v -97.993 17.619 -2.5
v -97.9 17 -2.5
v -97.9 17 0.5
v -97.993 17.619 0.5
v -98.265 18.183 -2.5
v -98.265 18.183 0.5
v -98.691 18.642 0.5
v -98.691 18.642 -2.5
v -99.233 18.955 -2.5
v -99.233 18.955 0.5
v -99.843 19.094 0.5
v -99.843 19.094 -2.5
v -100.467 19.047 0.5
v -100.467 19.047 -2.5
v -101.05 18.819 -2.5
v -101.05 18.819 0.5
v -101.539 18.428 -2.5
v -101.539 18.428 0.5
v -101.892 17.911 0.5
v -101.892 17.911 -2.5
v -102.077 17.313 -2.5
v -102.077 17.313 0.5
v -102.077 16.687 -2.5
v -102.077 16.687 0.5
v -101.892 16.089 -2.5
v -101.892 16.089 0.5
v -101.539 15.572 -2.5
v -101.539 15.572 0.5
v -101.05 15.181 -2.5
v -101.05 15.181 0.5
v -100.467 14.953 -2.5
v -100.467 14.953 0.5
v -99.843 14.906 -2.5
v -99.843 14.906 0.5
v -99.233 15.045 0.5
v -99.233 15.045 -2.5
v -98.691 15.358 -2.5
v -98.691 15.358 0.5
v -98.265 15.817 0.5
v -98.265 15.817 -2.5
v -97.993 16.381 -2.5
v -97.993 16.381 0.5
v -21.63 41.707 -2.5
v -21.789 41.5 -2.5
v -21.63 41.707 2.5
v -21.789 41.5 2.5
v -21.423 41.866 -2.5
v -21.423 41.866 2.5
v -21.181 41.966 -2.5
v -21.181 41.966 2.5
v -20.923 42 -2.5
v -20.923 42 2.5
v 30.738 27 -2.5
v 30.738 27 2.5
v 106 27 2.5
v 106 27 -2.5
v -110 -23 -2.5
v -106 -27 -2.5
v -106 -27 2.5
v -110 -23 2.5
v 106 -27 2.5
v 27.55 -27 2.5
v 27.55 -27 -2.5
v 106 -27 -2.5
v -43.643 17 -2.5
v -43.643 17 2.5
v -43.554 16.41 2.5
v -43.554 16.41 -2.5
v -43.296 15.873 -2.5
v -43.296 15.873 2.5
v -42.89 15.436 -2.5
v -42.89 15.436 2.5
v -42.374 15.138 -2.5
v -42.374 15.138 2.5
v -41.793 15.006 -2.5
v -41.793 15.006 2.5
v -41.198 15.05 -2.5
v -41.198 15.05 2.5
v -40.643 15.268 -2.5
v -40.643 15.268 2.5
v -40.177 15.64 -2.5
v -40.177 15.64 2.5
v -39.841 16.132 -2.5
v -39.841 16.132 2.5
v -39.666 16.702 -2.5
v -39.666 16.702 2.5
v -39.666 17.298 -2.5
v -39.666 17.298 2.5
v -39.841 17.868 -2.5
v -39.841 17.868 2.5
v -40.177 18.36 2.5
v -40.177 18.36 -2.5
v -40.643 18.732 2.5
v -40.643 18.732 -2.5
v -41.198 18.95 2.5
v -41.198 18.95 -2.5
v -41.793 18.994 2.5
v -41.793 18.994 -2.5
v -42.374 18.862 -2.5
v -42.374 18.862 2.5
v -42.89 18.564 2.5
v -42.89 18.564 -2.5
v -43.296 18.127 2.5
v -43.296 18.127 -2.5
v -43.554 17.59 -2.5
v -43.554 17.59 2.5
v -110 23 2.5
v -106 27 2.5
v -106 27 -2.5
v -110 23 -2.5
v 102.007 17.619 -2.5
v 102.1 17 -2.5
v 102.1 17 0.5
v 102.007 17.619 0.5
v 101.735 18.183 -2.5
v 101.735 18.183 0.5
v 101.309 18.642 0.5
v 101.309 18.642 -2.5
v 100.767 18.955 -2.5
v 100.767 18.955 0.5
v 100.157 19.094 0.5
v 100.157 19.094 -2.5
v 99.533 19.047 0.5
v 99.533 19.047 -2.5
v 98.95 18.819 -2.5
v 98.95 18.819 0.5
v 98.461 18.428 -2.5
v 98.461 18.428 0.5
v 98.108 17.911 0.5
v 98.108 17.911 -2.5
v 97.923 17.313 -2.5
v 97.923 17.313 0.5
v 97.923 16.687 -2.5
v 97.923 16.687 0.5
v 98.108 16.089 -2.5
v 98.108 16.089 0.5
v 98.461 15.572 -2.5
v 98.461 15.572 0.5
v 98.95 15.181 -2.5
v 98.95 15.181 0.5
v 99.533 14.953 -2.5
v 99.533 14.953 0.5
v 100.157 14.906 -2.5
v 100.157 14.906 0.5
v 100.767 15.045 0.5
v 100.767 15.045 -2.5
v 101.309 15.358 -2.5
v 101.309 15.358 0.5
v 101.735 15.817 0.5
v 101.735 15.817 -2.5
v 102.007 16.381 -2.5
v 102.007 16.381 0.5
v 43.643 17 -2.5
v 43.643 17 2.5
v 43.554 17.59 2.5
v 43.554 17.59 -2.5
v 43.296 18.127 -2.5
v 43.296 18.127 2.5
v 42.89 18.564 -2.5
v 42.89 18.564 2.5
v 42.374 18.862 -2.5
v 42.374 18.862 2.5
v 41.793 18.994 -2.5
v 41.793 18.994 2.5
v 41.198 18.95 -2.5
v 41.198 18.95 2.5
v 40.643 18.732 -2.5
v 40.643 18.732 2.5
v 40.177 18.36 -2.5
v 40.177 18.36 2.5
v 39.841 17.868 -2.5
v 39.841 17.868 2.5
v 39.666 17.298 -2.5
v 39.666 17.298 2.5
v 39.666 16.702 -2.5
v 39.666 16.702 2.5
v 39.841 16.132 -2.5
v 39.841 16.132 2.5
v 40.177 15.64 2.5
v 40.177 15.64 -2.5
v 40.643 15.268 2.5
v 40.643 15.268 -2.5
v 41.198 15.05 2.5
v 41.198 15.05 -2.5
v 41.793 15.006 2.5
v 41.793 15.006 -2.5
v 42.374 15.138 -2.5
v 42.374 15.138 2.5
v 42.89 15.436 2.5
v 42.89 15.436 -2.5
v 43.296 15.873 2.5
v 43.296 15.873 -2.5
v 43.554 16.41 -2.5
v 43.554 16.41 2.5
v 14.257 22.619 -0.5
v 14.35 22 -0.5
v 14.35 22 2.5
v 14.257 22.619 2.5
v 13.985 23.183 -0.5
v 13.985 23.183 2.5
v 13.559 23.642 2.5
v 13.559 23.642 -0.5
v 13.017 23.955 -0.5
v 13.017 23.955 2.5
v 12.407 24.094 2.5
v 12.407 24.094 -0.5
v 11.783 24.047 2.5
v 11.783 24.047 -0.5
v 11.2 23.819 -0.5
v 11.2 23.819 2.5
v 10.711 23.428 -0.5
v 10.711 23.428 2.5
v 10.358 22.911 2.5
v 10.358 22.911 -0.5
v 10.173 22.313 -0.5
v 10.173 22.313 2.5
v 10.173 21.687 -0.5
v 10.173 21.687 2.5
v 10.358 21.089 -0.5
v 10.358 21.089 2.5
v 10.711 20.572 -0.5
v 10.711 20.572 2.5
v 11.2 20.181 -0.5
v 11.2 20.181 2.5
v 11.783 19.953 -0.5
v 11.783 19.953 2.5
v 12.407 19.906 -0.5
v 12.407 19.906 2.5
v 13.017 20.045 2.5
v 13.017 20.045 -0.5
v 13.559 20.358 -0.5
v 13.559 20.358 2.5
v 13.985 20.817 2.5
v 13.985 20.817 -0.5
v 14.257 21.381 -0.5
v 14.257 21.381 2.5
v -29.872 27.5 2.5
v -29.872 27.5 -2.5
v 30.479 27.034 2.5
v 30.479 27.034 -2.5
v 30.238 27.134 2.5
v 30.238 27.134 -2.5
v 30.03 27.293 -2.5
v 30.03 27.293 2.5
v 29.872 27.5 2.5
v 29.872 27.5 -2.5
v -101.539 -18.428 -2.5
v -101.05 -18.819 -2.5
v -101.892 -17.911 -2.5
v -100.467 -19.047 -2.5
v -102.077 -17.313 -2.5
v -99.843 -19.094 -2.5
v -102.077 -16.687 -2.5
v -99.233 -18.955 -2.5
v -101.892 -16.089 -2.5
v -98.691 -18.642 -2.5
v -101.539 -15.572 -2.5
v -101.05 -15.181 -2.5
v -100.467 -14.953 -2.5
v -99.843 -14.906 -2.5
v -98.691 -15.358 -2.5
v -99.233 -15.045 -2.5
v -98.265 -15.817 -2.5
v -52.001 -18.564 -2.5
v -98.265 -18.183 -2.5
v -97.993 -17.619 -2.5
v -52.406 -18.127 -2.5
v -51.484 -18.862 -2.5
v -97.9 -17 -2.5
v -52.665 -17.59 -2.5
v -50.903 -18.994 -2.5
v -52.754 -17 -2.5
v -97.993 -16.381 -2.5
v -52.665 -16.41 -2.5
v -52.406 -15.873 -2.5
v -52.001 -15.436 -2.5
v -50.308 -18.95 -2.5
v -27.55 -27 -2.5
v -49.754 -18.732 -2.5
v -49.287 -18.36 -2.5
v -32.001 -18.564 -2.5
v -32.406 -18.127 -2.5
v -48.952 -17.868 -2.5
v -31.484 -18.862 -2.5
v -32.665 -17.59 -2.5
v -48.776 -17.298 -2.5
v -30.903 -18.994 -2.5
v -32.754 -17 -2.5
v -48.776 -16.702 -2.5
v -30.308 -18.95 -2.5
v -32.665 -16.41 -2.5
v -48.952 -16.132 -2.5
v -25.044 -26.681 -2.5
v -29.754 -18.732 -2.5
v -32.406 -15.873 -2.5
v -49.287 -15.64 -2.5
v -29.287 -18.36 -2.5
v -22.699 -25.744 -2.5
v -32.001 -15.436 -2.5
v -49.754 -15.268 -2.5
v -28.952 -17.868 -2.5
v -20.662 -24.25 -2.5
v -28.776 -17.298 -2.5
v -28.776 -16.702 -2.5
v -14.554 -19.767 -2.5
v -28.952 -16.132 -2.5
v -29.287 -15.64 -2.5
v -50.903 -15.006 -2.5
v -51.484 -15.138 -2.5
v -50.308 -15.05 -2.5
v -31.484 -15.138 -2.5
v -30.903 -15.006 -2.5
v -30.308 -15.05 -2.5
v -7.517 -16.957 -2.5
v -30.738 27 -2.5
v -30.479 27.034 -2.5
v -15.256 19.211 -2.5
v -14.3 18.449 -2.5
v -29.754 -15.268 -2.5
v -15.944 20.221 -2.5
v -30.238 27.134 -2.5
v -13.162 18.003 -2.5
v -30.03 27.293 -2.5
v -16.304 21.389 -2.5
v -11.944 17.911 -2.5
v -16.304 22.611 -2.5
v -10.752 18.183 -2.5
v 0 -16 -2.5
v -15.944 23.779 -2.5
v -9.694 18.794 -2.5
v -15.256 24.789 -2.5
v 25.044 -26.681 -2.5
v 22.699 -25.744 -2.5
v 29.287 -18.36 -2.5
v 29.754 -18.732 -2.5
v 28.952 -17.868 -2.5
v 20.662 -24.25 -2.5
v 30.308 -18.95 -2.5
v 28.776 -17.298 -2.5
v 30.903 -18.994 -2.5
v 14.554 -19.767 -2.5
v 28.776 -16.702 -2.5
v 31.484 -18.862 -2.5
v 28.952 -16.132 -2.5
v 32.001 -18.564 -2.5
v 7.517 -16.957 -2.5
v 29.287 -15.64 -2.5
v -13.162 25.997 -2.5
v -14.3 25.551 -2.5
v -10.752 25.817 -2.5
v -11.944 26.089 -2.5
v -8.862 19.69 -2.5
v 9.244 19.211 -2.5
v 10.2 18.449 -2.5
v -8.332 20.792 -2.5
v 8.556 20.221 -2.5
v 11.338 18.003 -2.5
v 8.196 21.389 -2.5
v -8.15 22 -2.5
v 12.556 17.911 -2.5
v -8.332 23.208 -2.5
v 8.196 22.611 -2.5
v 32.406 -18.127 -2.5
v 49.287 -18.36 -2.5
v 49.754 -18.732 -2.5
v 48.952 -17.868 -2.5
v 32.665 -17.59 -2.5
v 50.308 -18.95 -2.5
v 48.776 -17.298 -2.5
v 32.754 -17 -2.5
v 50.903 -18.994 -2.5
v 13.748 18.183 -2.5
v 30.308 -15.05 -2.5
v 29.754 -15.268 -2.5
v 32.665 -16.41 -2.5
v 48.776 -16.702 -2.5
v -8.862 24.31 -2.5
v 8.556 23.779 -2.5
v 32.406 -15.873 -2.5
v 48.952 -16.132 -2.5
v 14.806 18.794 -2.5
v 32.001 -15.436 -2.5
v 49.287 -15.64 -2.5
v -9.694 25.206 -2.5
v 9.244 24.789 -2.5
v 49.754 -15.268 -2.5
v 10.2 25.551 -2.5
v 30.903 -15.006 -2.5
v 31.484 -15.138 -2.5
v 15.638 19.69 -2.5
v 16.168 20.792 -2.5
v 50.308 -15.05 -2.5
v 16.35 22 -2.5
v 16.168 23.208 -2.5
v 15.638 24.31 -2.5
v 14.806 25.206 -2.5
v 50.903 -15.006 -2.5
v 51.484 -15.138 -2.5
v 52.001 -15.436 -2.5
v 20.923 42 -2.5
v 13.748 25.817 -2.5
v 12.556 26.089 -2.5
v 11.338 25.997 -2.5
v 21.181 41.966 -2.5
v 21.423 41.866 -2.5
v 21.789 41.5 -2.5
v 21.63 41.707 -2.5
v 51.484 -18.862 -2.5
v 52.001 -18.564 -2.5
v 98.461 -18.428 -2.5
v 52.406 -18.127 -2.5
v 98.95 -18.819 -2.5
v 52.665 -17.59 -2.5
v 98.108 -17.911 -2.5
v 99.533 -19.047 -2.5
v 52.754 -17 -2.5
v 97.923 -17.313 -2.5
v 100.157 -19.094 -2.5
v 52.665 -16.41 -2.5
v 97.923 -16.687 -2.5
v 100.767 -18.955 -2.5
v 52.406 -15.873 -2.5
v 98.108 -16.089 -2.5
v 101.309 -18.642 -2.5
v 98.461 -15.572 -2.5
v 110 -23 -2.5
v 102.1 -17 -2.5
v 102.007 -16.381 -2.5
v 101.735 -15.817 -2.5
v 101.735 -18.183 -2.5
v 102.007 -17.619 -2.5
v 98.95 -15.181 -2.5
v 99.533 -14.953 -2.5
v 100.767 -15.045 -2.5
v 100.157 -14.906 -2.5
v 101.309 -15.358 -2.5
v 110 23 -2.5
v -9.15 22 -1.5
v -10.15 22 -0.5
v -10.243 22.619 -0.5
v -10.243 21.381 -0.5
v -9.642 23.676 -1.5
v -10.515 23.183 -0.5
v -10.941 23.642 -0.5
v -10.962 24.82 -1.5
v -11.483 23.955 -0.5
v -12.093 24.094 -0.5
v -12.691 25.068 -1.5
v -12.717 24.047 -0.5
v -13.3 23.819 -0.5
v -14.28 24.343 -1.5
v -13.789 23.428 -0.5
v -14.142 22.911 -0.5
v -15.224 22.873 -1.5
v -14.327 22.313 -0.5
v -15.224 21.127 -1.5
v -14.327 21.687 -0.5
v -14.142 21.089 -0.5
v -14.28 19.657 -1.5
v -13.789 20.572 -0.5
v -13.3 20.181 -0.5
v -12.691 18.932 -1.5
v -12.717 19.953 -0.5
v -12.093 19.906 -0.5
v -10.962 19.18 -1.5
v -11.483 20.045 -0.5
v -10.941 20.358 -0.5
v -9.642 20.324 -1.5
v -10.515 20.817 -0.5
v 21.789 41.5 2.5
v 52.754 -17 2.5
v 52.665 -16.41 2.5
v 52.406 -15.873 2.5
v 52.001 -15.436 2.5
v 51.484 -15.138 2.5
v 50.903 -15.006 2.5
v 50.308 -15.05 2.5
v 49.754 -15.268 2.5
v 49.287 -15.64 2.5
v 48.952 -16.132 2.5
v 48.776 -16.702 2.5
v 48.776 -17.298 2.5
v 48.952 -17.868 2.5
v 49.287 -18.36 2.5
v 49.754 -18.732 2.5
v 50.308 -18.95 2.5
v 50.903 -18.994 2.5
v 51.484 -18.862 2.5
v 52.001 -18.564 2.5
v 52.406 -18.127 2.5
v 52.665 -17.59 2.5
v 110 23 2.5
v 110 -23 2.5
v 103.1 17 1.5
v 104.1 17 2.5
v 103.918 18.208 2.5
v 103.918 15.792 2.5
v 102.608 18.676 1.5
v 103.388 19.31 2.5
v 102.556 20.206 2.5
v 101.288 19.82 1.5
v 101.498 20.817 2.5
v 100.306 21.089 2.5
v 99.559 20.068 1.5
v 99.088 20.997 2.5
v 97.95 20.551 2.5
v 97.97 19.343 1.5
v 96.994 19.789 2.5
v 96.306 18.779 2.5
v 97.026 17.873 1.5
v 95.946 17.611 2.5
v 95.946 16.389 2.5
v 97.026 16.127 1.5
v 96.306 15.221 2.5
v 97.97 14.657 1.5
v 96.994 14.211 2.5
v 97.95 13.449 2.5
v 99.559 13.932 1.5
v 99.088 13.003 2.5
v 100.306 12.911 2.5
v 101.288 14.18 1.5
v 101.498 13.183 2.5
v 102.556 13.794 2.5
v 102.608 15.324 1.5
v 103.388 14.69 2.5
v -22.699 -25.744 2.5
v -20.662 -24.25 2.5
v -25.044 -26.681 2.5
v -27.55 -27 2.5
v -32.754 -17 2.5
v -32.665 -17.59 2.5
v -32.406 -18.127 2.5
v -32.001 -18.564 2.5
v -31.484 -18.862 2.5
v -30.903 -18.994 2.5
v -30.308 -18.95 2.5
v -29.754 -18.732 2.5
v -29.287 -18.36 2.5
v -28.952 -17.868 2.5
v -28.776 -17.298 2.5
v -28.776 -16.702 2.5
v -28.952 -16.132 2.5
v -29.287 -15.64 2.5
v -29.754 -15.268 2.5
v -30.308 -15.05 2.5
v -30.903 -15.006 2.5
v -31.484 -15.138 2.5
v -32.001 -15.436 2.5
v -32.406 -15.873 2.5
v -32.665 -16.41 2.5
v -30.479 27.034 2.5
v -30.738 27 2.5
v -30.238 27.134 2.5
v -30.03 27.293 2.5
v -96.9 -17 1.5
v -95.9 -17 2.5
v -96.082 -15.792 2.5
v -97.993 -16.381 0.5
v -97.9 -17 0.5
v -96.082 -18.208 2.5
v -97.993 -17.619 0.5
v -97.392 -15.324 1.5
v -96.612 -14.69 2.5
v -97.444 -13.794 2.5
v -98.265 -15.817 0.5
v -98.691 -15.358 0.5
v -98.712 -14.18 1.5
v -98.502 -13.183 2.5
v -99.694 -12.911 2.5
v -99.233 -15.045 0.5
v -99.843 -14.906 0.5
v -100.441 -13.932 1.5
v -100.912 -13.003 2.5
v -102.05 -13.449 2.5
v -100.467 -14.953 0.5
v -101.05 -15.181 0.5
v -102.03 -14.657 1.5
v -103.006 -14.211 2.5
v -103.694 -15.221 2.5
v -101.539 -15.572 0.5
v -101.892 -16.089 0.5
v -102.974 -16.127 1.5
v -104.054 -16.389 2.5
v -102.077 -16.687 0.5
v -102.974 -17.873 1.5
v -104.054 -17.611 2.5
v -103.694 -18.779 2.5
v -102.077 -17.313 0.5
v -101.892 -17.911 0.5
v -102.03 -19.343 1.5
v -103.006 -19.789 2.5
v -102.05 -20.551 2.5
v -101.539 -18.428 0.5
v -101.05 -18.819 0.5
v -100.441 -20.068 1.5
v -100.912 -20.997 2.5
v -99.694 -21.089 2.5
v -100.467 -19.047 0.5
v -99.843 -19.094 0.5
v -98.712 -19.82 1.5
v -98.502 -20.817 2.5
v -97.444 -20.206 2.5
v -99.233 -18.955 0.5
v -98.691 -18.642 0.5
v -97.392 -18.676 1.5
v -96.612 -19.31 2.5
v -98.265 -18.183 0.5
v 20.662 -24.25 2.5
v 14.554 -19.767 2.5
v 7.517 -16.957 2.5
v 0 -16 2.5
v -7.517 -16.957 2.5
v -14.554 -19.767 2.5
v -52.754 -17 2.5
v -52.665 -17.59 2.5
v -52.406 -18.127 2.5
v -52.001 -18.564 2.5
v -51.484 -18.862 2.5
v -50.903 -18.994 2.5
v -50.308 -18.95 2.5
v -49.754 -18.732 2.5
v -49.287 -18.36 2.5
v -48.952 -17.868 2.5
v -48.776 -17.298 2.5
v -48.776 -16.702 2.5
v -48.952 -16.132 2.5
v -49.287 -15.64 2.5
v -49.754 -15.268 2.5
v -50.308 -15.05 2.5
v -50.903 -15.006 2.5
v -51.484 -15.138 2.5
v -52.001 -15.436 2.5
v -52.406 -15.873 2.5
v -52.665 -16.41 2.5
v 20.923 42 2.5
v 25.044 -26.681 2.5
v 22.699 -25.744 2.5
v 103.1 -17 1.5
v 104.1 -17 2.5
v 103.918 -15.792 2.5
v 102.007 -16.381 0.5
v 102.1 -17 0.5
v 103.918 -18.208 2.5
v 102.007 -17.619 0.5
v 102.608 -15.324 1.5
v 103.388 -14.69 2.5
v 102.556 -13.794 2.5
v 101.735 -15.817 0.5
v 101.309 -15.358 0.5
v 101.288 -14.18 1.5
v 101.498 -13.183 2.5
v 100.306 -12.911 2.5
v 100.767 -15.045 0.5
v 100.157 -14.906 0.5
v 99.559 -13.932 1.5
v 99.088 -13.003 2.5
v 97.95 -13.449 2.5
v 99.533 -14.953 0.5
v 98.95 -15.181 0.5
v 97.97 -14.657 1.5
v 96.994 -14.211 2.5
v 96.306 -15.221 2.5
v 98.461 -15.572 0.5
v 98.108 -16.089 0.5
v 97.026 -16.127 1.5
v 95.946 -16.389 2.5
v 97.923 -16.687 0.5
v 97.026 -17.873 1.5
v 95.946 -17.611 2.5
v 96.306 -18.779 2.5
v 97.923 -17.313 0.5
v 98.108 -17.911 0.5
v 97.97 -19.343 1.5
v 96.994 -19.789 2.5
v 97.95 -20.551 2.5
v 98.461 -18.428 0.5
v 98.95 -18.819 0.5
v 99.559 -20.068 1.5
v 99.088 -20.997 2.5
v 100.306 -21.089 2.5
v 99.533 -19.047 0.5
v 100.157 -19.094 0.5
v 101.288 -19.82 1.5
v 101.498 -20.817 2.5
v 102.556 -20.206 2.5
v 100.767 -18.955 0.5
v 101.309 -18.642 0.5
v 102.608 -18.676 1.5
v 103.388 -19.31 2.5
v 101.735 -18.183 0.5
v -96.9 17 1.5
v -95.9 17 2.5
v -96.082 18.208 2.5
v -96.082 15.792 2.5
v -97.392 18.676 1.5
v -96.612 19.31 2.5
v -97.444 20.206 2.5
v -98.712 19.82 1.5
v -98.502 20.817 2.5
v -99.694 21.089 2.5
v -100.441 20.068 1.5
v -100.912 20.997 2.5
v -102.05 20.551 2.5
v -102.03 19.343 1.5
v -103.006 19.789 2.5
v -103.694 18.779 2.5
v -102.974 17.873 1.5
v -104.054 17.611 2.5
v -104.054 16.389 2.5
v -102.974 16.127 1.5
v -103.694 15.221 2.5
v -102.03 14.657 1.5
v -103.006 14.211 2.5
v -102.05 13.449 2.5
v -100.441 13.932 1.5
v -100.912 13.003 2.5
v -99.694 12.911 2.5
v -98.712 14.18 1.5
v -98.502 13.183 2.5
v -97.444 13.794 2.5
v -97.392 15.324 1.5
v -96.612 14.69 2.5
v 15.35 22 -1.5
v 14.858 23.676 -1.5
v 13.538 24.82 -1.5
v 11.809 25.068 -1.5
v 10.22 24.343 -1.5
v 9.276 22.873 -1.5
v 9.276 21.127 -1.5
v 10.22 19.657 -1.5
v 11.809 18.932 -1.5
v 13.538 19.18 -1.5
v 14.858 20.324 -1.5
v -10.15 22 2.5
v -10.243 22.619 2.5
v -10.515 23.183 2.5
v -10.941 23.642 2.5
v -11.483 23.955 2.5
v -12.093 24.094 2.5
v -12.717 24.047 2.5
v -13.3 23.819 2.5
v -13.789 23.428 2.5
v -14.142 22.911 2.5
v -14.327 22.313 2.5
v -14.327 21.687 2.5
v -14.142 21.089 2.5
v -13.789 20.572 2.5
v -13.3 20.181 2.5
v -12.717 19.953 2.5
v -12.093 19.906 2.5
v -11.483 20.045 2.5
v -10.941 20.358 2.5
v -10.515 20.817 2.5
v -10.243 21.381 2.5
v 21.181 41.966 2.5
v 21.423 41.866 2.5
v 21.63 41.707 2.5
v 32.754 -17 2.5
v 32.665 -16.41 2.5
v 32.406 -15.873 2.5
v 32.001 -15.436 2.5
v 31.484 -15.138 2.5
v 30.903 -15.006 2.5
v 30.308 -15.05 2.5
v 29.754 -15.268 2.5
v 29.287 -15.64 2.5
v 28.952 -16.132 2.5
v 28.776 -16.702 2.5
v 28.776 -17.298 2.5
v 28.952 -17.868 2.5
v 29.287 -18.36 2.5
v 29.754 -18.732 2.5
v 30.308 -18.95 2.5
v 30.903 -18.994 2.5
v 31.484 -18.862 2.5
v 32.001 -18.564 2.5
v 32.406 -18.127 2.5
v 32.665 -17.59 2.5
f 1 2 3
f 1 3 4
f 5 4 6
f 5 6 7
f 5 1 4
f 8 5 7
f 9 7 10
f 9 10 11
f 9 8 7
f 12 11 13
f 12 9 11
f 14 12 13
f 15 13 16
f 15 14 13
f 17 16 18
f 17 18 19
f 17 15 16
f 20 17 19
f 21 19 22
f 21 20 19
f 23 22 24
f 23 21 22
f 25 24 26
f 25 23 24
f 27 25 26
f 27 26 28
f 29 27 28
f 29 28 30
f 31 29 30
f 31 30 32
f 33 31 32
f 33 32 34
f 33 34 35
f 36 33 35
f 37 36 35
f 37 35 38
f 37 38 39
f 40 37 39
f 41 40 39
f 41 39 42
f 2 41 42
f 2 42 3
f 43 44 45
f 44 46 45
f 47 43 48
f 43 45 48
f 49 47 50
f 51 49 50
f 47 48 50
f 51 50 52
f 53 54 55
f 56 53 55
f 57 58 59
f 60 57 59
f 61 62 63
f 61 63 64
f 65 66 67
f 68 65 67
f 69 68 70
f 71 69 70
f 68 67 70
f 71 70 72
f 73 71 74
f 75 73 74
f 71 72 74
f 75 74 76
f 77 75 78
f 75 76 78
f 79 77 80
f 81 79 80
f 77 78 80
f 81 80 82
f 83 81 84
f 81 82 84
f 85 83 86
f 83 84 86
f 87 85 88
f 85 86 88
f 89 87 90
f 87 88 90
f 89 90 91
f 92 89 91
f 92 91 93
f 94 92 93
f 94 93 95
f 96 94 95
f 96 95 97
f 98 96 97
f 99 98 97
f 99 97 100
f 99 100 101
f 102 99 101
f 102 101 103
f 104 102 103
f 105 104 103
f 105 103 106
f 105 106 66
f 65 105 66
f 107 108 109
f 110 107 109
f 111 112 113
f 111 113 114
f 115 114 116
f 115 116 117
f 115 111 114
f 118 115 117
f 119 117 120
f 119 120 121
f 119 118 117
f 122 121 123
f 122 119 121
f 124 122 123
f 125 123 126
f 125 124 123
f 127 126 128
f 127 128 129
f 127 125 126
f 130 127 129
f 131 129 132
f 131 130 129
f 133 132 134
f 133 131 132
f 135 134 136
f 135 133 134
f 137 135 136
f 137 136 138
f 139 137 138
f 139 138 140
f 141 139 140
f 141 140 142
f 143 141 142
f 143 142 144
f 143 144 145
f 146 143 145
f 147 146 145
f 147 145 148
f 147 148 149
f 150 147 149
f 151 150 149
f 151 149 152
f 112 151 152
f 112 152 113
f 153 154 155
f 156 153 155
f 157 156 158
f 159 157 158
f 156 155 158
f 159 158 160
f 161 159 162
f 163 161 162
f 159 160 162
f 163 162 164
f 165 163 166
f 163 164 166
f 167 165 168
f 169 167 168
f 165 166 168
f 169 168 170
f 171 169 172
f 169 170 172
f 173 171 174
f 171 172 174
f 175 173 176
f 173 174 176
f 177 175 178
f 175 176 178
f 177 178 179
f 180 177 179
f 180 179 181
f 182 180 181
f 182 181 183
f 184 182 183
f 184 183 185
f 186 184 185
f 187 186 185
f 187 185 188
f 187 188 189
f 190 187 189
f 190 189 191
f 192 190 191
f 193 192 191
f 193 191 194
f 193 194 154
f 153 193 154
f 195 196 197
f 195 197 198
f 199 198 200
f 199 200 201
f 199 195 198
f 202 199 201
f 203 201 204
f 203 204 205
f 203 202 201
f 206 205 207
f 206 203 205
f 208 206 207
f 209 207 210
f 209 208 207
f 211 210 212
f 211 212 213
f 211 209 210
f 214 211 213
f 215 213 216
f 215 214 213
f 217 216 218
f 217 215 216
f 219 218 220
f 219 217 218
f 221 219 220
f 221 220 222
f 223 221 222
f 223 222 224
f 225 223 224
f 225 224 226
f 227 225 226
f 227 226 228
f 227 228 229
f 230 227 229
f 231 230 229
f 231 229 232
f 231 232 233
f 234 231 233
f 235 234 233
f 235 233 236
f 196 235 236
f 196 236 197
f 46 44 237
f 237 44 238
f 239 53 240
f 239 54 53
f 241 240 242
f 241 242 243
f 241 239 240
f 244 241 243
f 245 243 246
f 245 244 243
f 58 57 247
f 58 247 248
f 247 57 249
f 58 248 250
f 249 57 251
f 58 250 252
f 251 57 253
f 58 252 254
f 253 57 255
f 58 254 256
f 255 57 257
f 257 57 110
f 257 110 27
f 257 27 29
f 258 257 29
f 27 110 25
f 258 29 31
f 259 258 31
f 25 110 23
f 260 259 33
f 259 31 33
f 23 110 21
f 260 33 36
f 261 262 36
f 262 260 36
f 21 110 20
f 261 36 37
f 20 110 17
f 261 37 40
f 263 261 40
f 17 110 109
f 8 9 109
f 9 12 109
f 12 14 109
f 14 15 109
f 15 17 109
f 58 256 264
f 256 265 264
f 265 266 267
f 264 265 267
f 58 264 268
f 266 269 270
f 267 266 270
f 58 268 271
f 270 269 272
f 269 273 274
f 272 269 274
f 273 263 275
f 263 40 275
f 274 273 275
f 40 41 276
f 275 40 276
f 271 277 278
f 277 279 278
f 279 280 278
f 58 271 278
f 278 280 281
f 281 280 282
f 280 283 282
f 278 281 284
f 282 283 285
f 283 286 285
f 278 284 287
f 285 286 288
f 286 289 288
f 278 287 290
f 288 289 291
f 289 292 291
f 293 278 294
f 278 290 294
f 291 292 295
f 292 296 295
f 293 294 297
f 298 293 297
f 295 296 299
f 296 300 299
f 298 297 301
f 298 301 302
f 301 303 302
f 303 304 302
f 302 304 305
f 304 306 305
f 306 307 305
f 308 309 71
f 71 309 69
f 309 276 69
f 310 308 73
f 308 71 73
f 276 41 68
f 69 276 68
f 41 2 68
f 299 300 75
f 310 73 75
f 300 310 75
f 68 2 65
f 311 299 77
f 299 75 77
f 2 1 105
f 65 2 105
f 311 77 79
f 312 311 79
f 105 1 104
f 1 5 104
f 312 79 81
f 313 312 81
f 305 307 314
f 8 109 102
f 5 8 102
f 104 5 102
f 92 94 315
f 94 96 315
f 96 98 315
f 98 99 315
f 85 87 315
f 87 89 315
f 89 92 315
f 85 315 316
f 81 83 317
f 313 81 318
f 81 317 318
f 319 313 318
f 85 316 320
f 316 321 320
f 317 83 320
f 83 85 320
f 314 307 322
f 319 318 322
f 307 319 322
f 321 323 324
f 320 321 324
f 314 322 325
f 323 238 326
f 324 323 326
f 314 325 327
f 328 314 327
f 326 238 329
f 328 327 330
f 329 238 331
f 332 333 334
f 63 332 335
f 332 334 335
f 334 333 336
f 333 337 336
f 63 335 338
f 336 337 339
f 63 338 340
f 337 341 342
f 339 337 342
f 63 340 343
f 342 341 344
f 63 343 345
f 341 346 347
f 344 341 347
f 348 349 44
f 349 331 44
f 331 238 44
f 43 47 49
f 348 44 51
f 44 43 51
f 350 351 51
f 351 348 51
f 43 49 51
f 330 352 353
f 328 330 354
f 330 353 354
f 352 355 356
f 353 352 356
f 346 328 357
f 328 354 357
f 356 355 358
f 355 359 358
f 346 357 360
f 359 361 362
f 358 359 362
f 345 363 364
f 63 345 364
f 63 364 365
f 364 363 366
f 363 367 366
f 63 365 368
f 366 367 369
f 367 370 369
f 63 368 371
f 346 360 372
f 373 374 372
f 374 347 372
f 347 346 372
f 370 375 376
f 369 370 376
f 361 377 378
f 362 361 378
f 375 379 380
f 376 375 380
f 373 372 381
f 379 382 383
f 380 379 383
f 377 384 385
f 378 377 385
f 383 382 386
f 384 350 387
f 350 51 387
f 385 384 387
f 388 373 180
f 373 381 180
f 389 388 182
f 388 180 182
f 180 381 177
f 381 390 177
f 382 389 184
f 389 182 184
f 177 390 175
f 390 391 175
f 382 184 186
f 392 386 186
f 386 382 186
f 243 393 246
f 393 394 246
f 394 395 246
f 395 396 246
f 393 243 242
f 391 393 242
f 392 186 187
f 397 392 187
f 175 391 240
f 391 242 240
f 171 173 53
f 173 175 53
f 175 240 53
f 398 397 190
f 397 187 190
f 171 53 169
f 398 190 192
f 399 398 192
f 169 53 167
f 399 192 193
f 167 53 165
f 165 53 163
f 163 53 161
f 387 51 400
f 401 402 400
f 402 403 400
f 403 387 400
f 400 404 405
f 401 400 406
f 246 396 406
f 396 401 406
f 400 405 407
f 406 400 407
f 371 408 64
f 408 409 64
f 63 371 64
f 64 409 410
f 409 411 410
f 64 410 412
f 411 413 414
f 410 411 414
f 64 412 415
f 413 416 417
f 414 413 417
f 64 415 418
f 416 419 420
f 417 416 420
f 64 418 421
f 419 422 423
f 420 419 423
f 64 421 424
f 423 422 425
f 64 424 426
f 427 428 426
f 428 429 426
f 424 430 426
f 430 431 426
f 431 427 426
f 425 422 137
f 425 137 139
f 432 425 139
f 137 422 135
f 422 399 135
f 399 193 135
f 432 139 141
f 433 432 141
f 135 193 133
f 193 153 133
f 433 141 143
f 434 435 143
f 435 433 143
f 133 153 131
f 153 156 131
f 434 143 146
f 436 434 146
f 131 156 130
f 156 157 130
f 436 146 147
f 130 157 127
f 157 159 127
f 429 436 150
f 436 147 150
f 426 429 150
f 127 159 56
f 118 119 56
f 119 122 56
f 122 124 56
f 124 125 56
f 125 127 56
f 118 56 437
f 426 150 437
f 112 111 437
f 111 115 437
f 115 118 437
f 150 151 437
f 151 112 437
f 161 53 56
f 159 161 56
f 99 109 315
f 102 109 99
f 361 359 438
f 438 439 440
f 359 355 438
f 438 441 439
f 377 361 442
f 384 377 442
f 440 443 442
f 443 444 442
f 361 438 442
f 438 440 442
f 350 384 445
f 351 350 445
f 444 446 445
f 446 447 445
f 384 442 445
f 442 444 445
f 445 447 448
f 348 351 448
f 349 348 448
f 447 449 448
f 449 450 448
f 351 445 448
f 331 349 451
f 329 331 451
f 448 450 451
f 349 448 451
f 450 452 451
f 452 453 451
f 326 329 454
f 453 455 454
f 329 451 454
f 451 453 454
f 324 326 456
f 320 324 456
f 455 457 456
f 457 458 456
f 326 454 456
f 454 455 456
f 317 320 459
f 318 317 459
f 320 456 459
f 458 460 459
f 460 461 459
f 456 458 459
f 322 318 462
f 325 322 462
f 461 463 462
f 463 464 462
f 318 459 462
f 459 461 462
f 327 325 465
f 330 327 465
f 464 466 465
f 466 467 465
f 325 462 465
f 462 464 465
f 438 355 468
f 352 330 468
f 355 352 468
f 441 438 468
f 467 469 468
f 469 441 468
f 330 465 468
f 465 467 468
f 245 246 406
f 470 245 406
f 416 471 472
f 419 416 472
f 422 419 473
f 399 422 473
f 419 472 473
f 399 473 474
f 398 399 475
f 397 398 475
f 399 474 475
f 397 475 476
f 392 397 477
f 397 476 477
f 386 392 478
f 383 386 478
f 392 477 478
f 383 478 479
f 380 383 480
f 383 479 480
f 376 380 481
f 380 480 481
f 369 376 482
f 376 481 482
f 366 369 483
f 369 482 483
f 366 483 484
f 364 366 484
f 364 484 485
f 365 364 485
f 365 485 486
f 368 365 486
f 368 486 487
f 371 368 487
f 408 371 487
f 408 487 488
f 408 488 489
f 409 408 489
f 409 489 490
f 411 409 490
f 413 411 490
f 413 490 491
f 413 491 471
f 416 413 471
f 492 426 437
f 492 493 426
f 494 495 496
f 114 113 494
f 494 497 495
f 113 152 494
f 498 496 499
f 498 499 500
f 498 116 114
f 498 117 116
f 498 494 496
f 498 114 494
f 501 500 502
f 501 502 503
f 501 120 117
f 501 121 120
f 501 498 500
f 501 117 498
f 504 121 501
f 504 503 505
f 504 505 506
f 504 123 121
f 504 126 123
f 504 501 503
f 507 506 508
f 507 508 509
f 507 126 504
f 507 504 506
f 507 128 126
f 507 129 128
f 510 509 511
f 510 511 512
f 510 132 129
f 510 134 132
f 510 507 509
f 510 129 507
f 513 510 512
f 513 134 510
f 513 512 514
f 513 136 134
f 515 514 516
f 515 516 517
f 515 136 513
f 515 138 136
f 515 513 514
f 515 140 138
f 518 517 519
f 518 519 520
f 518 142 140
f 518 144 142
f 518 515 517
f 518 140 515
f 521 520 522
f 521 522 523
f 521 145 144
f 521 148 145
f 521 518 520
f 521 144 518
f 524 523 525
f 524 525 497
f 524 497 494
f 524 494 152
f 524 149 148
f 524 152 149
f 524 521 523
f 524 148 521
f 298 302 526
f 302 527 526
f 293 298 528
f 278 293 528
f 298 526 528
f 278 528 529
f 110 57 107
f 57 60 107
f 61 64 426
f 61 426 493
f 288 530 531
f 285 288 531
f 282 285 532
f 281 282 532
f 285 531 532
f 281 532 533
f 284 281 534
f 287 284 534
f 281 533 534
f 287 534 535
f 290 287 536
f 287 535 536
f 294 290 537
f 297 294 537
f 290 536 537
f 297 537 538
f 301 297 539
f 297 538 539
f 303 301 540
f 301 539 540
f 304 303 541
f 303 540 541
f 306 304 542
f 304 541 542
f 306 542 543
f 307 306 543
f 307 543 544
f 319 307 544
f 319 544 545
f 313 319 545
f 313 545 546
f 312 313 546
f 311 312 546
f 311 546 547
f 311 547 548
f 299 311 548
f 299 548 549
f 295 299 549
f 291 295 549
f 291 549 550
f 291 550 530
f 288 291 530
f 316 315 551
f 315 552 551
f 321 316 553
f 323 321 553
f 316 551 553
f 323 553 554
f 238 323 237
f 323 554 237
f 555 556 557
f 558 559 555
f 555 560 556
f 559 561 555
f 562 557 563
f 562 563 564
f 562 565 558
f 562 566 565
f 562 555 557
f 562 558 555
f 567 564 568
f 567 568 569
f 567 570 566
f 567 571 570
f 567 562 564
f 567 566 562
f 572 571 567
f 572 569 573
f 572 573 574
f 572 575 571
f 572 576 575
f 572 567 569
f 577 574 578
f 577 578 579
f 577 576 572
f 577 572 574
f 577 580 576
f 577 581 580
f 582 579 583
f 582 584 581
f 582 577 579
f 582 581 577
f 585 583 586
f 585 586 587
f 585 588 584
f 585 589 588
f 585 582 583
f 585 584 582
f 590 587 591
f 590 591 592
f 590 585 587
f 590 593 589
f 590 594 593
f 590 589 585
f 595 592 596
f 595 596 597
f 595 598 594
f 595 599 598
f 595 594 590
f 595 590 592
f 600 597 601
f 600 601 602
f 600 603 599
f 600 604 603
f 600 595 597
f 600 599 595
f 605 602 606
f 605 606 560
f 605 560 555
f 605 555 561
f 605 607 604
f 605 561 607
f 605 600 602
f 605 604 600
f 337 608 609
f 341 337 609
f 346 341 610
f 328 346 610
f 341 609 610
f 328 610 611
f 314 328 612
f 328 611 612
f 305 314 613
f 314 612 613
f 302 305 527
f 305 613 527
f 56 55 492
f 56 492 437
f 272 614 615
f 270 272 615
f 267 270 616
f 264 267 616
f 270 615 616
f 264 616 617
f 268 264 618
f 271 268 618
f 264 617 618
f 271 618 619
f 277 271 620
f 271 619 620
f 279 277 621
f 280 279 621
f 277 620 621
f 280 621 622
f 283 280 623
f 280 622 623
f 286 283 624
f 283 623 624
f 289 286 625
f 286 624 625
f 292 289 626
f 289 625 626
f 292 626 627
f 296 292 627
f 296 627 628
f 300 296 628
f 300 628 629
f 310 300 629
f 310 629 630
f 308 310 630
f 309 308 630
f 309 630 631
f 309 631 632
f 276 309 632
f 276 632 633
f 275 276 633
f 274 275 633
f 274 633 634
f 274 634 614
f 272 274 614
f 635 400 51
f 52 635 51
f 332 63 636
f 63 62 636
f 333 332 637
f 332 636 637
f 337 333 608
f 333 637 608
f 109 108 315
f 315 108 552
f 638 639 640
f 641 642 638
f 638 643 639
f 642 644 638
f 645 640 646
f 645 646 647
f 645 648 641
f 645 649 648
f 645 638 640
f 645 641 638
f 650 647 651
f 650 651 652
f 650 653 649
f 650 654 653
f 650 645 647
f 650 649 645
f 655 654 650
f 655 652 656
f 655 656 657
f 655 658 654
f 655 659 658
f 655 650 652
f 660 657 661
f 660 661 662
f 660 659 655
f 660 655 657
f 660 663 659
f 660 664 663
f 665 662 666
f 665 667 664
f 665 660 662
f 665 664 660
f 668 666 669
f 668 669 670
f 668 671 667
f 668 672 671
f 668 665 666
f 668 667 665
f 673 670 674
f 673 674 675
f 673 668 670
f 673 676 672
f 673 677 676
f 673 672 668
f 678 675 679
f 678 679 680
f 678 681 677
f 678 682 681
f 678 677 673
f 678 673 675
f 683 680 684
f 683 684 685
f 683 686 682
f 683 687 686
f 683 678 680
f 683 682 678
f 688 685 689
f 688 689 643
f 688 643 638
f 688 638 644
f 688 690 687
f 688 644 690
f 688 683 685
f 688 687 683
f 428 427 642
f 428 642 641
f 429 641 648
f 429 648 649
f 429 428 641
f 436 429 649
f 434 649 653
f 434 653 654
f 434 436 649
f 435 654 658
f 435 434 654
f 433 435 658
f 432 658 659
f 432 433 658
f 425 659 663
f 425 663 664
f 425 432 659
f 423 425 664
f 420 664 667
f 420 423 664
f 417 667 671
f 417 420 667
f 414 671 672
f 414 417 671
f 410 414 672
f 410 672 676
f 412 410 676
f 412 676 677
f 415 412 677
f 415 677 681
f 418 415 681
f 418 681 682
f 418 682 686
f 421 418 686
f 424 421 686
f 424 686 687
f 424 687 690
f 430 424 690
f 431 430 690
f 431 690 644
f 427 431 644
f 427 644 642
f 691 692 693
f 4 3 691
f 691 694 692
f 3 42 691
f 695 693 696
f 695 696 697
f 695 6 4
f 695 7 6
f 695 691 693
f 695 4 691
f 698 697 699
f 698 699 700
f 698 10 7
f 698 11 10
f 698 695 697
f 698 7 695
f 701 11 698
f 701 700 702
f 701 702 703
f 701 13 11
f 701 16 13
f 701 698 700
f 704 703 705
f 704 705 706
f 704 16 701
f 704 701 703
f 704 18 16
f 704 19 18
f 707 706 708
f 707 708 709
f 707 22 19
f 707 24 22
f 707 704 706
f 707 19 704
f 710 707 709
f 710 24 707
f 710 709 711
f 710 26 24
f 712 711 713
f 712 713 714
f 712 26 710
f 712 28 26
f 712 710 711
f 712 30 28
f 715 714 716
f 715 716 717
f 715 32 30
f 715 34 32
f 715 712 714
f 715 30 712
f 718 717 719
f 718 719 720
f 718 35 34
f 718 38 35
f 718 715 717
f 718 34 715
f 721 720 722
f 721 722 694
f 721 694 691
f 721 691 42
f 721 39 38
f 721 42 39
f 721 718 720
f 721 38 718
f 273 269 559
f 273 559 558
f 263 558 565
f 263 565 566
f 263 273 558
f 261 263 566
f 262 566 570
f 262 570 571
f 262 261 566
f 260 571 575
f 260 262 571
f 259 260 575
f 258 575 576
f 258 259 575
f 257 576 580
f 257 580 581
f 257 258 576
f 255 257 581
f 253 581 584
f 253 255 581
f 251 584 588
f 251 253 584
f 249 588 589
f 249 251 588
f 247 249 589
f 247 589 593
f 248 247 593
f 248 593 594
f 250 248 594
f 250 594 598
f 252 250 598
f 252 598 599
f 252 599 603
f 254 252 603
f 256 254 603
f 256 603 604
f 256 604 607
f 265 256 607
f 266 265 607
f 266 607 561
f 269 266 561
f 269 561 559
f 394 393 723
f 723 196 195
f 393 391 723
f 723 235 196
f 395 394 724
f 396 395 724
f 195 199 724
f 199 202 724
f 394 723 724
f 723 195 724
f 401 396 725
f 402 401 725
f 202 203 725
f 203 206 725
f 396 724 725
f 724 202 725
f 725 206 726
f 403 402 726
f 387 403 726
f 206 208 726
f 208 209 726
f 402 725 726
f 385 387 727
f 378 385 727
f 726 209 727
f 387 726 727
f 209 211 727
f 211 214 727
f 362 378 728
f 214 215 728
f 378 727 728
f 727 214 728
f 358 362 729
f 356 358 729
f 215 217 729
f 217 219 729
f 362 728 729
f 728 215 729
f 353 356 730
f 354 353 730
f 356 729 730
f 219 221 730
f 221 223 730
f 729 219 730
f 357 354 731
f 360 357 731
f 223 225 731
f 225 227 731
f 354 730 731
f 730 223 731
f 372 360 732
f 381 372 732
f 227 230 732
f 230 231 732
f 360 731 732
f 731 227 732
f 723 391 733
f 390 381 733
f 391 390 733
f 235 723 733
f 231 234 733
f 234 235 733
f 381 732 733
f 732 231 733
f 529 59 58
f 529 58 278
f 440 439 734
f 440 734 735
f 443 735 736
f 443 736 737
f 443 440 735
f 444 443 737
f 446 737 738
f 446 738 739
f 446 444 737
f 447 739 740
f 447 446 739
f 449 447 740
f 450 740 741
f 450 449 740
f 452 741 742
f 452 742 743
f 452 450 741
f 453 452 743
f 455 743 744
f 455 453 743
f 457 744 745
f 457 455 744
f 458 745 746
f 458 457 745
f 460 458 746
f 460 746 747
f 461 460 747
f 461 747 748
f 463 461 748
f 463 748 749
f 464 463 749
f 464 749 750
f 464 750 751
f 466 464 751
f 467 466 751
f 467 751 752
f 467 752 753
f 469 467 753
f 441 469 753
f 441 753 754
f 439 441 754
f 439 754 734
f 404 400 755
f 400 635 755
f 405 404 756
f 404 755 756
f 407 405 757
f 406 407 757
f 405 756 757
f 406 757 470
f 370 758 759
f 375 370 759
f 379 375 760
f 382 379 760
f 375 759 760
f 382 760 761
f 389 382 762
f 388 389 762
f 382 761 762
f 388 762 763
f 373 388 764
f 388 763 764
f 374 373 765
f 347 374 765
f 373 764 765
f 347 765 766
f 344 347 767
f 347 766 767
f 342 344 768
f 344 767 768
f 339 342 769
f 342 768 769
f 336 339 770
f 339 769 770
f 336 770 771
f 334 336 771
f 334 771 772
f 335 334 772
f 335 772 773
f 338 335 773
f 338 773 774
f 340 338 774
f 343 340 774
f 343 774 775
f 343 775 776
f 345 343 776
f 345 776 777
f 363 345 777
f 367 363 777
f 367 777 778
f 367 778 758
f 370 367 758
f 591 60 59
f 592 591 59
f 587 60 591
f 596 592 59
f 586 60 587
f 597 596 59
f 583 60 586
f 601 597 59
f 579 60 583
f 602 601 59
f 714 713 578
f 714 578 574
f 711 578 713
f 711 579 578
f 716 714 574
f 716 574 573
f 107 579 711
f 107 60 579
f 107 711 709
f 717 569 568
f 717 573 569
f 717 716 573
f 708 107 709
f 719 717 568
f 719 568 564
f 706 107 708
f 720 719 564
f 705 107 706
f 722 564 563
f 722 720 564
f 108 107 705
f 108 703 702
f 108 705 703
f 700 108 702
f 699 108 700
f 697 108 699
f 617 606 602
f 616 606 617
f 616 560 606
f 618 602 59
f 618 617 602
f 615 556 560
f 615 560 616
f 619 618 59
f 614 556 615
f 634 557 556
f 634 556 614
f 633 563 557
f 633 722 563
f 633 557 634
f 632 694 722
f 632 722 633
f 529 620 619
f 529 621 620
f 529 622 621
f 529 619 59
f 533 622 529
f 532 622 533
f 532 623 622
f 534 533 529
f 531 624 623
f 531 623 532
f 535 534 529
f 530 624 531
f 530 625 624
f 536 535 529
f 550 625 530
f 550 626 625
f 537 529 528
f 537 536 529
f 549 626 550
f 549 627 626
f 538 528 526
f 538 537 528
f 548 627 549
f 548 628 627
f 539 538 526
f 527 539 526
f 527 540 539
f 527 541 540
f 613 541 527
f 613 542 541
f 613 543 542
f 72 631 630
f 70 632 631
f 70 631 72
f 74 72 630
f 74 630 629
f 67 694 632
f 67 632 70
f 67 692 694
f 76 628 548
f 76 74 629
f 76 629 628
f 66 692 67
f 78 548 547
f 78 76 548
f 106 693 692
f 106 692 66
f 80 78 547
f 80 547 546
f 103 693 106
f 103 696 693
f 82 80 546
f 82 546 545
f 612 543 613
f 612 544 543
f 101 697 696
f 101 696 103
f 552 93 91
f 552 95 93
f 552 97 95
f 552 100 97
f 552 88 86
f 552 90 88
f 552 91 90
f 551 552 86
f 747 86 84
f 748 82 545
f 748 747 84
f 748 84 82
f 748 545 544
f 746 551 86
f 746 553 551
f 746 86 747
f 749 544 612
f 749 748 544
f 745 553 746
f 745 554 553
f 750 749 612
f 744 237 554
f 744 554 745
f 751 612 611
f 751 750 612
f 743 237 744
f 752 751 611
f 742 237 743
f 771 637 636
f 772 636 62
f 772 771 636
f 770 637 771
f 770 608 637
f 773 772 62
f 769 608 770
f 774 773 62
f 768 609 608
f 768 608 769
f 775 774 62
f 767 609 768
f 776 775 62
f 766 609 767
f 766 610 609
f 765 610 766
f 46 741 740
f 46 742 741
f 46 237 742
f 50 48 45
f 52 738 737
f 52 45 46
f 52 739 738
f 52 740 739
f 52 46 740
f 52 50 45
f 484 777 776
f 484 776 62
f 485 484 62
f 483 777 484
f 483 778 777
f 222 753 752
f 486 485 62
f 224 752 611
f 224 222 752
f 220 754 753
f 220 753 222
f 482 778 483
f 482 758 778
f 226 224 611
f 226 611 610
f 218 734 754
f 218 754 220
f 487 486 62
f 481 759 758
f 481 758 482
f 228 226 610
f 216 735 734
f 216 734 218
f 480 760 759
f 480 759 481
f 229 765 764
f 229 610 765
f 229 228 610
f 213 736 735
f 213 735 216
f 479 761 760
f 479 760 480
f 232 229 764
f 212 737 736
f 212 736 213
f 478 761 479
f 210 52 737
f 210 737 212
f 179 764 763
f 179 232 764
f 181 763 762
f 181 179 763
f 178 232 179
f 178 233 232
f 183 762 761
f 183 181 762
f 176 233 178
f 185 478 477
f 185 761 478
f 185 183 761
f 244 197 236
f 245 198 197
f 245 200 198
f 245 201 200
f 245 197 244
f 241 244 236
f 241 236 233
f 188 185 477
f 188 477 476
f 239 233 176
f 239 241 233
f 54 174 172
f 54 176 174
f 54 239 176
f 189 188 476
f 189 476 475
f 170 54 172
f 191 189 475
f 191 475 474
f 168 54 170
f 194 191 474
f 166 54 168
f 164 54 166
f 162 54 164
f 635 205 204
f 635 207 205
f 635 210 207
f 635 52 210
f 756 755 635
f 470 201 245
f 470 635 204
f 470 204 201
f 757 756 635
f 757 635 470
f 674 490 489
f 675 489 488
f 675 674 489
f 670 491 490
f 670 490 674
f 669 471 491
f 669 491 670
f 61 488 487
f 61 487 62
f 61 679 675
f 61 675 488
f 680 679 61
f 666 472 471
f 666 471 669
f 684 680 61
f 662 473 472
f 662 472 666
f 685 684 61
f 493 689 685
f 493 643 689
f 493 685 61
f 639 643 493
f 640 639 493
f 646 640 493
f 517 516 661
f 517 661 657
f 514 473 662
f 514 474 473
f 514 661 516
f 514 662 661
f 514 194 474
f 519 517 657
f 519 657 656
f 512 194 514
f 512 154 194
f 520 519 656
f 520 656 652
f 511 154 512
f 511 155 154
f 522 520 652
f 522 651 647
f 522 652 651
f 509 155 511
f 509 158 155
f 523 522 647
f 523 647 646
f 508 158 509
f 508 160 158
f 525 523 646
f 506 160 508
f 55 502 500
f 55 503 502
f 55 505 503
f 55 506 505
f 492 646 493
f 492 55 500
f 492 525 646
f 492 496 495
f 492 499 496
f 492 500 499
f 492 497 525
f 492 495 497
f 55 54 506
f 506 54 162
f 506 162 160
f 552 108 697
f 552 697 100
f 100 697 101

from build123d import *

# Parameters (mm, degrees)
SKETCH_1_W          = 220
SKETCH_1_H          = 54
SKETCH_1_R          = 2.1
EXTRUDE_1_DEPTH     = 2.5
CHAMFER_1_SIZE      = 4
CHAMFER_2_SIZE      = 2
SKETCH_3_R          = 2
CUT_EXTRUDE_1_DEPTH = 114.375482358
SKETCH_4_R          = 30
CUT_EXTRUDE_2_DEPTH = 114.375482358
FILLET_1_R          = 10
EXTRUDE_2_DEPTH     = 5
FILLET_2_R          = 1


with BuildPart() as part:
    # 草图1 → 凸台-拉伸1 (new, symmetric)
    with BuildSketch(Plane.XY):
        Rectangle(SKETCH_1_W, SKETCH_1_H)
        with Locations((-100, 17)):
            Circle(SKETCH_1_R, mode=Mode.SUBTRACT)
        with Locations((-100, -17)):
            Circle(SKETCH_1_R, mode=Mode.SUBTRACT)
        with Locations((100, 17)):
            Circle(SKETCH_1_R, mode=Mode.SUBTRACT)
        with Locations((100, -17)):
            Circle(SKETCH_1_R, mode=Mode.SUBTRACT)
        with Locations((-12.25, 22)):
            Circle(SKETCH_1_R, mode=Mode.SUBTRACT)
        with Locations((12.25, 22)):
            Circle(SKETCH_1_R, mode=Mode.SUBTRACT)
    extrude(amount=EXTRUDE_1_DEPTH, both=True)

    # 倒角1
    chamfer_1_edges = [part.edges().sort_by_distance(p)[0] for p in [
        (-110, 27, 0),
        (110, 27, 0),
        (110, -27, 0),
        (-110, -27, 0),
    ]]
    chamfer(chamfer_1_edges, length=CHAMFER_1_SIZE)

    # 倒角2
    chamfer_2_edges = [part.edges().sort_by_distance(p)[0] for p in [
        (-102.1, 17, 2.5),
        (-102.1, -17, 2.5),
        (97.9, 17, 2.5),
        (97.9, -17, 2.5),
        (-14.35, 22, -2.5),
        (10.15, 22, -2.5),
    ]]
    chamfer(chamfer_2_edges, length=CHAMFER_2_SIZE)

    # 草图3 → 切除-拉伸1 (cut, through all)
    with BuildSketch(Plane.XY.offset(2.5)):
        with Locations((50.753537587, -17)):
            Circle(SKETCH_3_R)
        with Locations((41.643265044, 17)):
            Circle(SKETCH_3_R)
        with Locations((30.753537587, -17)):
            Circle(SKETCH_3_R)
        with Locations(Location((-41.643265044, 17, 0), (0, 0, 180))):
            Circle(SKETCH_3_R)
        with Locations(Location((-50.753537587, -17, 0), (0, 0, 180))):
            Circle(SKETCH_3_R)
        with Locations(Location((-30.753537587, -17, 0), (0, 0, 180))):
            Circle(SKETCH_3_R)
    extrude(amount=-CUT_EXTRUDE_1_DEPTH, mode=Mode.SUBTRACT)

    # 草图4 → 切除-拉伸2 (cut, through all)
    with BuildSketch(Plane.XY.offset(2.5)):
        with Locations((0, -46)):
            Circle(SKETCH_4_R)
    extrude(amount=-CUT_EXTRUDE_2_DEPTH, mode=Mode.SUBTRACT)

    # 圆角1
    fillet_1_edges = [part.edges().sort_by_distance(p)[0] for p in [
        (23.216373532, -27, 0),
        (-23.216373532, -27, 0),
    ]]
    fillet(fillet_1_edges, radius=FILLET_1_R)

    # 草图5 → 凸台-拉伸2 (add)
    with BuildSketch(Plane(origin=(0, 0, -2.5), x_dir=(-1, 0, 0), z_dir=(0, 0, -1))):
        Polygon((-21.5, 42), (21.5, 42), (30.160254038, 27), (-30.160254038, 27), align=None)
    extrude(amount=-EXTRUDE_2_DEPTH)

    # 圆角2
    fillet_2_edges = [part.edges().sort_by_distance(p)[0] for p in [
        (-30.160254038, 27, 0),
        (-21.5, 42, 0),
        (21.5, 42, 0),
        (30.160254038, 27, 0),
    ]]
    fillet(fillet_2_edges, radius=FILLET_2_R)


solid = part.part
